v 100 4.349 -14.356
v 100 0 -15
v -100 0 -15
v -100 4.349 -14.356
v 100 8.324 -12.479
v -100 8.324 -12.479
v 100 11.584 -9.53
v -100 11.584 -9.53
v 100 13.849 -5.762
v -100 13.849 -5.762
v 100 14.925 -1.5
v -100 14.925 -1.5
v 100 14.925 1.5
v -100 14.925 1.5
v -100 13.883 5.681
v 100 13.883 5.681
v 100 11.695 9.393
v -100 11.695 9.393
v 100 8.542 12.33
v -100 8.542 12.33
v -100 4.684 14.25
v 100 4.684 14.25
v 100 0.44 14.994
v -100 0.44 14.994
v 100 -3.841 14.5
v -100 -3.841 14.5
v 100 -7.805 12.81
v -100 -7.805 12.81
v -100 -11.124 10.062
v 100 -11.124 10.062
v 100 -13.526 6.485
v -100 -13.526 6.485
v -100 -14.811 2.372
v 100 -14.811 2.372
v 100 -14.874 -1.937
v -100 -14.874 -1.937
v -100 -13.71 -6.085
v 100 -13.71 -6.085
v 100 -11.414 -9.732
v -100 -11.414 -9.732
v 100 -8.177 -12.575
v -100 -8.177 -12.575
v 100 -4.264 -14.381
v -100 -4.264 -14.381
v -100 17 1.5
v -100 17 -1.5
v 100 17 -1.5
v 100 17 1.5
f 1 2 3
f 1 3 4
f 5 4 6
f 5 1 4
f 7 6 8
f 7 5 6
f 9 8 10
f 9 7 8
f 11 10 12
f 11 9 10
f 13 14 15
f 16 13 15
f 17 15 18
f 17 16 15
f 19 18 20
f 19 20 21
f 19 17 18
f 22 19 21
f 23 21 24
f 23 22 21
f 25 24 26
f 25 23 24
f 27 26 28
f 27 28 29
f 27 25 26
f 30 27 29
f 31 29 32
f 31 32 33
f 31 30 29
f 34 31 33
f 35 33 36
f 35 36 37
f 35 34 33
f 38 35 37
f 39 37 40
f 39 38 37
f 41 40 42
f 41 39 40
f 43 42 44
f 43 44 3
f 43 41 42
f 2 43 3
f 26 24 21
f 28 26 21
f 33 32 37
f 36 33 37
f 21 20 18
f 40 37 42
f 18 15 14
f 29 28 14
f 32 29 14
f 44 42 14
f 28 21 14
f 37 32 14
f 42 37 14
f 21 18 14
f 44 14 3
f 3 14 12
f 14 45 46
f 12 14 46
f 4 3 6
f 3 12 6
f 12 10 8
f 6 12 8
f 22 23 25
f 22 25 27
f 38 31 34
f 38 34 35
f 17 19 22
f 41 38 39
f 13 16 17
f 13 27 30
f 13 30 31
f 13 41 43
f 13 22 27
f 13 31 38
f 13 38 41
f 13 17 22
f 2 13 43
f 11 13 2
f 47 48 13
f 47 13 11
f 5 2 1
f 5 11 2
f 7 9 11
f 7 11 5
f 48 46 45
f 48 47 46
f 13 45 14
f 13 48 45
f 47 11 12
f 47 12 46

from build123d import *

# Parameters (mm, degrees)
EXTRUDE_1_DEPTH = 100


with BuildPart() as part:
    # 草图1 → 凸台-拉伸1 (new, symmetric)
    with BuildSketch(Plane(origin=(0, 0, 0), x_dir=(0, 0, -1), z_dir=(1, 0, 0))):
        with BuildLine():
            Line((-1.5, 14.924811557), (-1.5, 0))
            Line((-1.5, 0), (1.5, 0))
            Line((1.5, 0), (1.5, 14.924811557))
            ThreePointArc((1.5, 14.924811557), (0, 15), (-1.5, 14.924811557))
        make_face()
        with BuildLine():
            Line((1.5, 0), (-1.5, 0))
            Line((-1.5, 0), (-1.5, 14.924811557))
            ThreePointArc((-1.5, 14.924811557), (-10.062305899, -11.124297731), (15, 0))
            ThreePointArc((15, 0), (11.124297731, 10.062305899), (1.5, 14.924811557))
            Line((1.5, 14.924811557), (1.5, 0))
        make_face()
        with BuildLine():
            Line((-1.5, 17), (-1.5, 14.924811557))
            ThreePointArc((-1.5, 14.924811557), (0, 15), (1.5, 14.924811557))
            Line((1.5, 14.924811557), (1.5, 17))
            Line((1.5, 17), (-1.5, 17))
        make_face()
    extrude(amount=EXTRUDE_1_DEPTH, both=True)


solid = part.part
